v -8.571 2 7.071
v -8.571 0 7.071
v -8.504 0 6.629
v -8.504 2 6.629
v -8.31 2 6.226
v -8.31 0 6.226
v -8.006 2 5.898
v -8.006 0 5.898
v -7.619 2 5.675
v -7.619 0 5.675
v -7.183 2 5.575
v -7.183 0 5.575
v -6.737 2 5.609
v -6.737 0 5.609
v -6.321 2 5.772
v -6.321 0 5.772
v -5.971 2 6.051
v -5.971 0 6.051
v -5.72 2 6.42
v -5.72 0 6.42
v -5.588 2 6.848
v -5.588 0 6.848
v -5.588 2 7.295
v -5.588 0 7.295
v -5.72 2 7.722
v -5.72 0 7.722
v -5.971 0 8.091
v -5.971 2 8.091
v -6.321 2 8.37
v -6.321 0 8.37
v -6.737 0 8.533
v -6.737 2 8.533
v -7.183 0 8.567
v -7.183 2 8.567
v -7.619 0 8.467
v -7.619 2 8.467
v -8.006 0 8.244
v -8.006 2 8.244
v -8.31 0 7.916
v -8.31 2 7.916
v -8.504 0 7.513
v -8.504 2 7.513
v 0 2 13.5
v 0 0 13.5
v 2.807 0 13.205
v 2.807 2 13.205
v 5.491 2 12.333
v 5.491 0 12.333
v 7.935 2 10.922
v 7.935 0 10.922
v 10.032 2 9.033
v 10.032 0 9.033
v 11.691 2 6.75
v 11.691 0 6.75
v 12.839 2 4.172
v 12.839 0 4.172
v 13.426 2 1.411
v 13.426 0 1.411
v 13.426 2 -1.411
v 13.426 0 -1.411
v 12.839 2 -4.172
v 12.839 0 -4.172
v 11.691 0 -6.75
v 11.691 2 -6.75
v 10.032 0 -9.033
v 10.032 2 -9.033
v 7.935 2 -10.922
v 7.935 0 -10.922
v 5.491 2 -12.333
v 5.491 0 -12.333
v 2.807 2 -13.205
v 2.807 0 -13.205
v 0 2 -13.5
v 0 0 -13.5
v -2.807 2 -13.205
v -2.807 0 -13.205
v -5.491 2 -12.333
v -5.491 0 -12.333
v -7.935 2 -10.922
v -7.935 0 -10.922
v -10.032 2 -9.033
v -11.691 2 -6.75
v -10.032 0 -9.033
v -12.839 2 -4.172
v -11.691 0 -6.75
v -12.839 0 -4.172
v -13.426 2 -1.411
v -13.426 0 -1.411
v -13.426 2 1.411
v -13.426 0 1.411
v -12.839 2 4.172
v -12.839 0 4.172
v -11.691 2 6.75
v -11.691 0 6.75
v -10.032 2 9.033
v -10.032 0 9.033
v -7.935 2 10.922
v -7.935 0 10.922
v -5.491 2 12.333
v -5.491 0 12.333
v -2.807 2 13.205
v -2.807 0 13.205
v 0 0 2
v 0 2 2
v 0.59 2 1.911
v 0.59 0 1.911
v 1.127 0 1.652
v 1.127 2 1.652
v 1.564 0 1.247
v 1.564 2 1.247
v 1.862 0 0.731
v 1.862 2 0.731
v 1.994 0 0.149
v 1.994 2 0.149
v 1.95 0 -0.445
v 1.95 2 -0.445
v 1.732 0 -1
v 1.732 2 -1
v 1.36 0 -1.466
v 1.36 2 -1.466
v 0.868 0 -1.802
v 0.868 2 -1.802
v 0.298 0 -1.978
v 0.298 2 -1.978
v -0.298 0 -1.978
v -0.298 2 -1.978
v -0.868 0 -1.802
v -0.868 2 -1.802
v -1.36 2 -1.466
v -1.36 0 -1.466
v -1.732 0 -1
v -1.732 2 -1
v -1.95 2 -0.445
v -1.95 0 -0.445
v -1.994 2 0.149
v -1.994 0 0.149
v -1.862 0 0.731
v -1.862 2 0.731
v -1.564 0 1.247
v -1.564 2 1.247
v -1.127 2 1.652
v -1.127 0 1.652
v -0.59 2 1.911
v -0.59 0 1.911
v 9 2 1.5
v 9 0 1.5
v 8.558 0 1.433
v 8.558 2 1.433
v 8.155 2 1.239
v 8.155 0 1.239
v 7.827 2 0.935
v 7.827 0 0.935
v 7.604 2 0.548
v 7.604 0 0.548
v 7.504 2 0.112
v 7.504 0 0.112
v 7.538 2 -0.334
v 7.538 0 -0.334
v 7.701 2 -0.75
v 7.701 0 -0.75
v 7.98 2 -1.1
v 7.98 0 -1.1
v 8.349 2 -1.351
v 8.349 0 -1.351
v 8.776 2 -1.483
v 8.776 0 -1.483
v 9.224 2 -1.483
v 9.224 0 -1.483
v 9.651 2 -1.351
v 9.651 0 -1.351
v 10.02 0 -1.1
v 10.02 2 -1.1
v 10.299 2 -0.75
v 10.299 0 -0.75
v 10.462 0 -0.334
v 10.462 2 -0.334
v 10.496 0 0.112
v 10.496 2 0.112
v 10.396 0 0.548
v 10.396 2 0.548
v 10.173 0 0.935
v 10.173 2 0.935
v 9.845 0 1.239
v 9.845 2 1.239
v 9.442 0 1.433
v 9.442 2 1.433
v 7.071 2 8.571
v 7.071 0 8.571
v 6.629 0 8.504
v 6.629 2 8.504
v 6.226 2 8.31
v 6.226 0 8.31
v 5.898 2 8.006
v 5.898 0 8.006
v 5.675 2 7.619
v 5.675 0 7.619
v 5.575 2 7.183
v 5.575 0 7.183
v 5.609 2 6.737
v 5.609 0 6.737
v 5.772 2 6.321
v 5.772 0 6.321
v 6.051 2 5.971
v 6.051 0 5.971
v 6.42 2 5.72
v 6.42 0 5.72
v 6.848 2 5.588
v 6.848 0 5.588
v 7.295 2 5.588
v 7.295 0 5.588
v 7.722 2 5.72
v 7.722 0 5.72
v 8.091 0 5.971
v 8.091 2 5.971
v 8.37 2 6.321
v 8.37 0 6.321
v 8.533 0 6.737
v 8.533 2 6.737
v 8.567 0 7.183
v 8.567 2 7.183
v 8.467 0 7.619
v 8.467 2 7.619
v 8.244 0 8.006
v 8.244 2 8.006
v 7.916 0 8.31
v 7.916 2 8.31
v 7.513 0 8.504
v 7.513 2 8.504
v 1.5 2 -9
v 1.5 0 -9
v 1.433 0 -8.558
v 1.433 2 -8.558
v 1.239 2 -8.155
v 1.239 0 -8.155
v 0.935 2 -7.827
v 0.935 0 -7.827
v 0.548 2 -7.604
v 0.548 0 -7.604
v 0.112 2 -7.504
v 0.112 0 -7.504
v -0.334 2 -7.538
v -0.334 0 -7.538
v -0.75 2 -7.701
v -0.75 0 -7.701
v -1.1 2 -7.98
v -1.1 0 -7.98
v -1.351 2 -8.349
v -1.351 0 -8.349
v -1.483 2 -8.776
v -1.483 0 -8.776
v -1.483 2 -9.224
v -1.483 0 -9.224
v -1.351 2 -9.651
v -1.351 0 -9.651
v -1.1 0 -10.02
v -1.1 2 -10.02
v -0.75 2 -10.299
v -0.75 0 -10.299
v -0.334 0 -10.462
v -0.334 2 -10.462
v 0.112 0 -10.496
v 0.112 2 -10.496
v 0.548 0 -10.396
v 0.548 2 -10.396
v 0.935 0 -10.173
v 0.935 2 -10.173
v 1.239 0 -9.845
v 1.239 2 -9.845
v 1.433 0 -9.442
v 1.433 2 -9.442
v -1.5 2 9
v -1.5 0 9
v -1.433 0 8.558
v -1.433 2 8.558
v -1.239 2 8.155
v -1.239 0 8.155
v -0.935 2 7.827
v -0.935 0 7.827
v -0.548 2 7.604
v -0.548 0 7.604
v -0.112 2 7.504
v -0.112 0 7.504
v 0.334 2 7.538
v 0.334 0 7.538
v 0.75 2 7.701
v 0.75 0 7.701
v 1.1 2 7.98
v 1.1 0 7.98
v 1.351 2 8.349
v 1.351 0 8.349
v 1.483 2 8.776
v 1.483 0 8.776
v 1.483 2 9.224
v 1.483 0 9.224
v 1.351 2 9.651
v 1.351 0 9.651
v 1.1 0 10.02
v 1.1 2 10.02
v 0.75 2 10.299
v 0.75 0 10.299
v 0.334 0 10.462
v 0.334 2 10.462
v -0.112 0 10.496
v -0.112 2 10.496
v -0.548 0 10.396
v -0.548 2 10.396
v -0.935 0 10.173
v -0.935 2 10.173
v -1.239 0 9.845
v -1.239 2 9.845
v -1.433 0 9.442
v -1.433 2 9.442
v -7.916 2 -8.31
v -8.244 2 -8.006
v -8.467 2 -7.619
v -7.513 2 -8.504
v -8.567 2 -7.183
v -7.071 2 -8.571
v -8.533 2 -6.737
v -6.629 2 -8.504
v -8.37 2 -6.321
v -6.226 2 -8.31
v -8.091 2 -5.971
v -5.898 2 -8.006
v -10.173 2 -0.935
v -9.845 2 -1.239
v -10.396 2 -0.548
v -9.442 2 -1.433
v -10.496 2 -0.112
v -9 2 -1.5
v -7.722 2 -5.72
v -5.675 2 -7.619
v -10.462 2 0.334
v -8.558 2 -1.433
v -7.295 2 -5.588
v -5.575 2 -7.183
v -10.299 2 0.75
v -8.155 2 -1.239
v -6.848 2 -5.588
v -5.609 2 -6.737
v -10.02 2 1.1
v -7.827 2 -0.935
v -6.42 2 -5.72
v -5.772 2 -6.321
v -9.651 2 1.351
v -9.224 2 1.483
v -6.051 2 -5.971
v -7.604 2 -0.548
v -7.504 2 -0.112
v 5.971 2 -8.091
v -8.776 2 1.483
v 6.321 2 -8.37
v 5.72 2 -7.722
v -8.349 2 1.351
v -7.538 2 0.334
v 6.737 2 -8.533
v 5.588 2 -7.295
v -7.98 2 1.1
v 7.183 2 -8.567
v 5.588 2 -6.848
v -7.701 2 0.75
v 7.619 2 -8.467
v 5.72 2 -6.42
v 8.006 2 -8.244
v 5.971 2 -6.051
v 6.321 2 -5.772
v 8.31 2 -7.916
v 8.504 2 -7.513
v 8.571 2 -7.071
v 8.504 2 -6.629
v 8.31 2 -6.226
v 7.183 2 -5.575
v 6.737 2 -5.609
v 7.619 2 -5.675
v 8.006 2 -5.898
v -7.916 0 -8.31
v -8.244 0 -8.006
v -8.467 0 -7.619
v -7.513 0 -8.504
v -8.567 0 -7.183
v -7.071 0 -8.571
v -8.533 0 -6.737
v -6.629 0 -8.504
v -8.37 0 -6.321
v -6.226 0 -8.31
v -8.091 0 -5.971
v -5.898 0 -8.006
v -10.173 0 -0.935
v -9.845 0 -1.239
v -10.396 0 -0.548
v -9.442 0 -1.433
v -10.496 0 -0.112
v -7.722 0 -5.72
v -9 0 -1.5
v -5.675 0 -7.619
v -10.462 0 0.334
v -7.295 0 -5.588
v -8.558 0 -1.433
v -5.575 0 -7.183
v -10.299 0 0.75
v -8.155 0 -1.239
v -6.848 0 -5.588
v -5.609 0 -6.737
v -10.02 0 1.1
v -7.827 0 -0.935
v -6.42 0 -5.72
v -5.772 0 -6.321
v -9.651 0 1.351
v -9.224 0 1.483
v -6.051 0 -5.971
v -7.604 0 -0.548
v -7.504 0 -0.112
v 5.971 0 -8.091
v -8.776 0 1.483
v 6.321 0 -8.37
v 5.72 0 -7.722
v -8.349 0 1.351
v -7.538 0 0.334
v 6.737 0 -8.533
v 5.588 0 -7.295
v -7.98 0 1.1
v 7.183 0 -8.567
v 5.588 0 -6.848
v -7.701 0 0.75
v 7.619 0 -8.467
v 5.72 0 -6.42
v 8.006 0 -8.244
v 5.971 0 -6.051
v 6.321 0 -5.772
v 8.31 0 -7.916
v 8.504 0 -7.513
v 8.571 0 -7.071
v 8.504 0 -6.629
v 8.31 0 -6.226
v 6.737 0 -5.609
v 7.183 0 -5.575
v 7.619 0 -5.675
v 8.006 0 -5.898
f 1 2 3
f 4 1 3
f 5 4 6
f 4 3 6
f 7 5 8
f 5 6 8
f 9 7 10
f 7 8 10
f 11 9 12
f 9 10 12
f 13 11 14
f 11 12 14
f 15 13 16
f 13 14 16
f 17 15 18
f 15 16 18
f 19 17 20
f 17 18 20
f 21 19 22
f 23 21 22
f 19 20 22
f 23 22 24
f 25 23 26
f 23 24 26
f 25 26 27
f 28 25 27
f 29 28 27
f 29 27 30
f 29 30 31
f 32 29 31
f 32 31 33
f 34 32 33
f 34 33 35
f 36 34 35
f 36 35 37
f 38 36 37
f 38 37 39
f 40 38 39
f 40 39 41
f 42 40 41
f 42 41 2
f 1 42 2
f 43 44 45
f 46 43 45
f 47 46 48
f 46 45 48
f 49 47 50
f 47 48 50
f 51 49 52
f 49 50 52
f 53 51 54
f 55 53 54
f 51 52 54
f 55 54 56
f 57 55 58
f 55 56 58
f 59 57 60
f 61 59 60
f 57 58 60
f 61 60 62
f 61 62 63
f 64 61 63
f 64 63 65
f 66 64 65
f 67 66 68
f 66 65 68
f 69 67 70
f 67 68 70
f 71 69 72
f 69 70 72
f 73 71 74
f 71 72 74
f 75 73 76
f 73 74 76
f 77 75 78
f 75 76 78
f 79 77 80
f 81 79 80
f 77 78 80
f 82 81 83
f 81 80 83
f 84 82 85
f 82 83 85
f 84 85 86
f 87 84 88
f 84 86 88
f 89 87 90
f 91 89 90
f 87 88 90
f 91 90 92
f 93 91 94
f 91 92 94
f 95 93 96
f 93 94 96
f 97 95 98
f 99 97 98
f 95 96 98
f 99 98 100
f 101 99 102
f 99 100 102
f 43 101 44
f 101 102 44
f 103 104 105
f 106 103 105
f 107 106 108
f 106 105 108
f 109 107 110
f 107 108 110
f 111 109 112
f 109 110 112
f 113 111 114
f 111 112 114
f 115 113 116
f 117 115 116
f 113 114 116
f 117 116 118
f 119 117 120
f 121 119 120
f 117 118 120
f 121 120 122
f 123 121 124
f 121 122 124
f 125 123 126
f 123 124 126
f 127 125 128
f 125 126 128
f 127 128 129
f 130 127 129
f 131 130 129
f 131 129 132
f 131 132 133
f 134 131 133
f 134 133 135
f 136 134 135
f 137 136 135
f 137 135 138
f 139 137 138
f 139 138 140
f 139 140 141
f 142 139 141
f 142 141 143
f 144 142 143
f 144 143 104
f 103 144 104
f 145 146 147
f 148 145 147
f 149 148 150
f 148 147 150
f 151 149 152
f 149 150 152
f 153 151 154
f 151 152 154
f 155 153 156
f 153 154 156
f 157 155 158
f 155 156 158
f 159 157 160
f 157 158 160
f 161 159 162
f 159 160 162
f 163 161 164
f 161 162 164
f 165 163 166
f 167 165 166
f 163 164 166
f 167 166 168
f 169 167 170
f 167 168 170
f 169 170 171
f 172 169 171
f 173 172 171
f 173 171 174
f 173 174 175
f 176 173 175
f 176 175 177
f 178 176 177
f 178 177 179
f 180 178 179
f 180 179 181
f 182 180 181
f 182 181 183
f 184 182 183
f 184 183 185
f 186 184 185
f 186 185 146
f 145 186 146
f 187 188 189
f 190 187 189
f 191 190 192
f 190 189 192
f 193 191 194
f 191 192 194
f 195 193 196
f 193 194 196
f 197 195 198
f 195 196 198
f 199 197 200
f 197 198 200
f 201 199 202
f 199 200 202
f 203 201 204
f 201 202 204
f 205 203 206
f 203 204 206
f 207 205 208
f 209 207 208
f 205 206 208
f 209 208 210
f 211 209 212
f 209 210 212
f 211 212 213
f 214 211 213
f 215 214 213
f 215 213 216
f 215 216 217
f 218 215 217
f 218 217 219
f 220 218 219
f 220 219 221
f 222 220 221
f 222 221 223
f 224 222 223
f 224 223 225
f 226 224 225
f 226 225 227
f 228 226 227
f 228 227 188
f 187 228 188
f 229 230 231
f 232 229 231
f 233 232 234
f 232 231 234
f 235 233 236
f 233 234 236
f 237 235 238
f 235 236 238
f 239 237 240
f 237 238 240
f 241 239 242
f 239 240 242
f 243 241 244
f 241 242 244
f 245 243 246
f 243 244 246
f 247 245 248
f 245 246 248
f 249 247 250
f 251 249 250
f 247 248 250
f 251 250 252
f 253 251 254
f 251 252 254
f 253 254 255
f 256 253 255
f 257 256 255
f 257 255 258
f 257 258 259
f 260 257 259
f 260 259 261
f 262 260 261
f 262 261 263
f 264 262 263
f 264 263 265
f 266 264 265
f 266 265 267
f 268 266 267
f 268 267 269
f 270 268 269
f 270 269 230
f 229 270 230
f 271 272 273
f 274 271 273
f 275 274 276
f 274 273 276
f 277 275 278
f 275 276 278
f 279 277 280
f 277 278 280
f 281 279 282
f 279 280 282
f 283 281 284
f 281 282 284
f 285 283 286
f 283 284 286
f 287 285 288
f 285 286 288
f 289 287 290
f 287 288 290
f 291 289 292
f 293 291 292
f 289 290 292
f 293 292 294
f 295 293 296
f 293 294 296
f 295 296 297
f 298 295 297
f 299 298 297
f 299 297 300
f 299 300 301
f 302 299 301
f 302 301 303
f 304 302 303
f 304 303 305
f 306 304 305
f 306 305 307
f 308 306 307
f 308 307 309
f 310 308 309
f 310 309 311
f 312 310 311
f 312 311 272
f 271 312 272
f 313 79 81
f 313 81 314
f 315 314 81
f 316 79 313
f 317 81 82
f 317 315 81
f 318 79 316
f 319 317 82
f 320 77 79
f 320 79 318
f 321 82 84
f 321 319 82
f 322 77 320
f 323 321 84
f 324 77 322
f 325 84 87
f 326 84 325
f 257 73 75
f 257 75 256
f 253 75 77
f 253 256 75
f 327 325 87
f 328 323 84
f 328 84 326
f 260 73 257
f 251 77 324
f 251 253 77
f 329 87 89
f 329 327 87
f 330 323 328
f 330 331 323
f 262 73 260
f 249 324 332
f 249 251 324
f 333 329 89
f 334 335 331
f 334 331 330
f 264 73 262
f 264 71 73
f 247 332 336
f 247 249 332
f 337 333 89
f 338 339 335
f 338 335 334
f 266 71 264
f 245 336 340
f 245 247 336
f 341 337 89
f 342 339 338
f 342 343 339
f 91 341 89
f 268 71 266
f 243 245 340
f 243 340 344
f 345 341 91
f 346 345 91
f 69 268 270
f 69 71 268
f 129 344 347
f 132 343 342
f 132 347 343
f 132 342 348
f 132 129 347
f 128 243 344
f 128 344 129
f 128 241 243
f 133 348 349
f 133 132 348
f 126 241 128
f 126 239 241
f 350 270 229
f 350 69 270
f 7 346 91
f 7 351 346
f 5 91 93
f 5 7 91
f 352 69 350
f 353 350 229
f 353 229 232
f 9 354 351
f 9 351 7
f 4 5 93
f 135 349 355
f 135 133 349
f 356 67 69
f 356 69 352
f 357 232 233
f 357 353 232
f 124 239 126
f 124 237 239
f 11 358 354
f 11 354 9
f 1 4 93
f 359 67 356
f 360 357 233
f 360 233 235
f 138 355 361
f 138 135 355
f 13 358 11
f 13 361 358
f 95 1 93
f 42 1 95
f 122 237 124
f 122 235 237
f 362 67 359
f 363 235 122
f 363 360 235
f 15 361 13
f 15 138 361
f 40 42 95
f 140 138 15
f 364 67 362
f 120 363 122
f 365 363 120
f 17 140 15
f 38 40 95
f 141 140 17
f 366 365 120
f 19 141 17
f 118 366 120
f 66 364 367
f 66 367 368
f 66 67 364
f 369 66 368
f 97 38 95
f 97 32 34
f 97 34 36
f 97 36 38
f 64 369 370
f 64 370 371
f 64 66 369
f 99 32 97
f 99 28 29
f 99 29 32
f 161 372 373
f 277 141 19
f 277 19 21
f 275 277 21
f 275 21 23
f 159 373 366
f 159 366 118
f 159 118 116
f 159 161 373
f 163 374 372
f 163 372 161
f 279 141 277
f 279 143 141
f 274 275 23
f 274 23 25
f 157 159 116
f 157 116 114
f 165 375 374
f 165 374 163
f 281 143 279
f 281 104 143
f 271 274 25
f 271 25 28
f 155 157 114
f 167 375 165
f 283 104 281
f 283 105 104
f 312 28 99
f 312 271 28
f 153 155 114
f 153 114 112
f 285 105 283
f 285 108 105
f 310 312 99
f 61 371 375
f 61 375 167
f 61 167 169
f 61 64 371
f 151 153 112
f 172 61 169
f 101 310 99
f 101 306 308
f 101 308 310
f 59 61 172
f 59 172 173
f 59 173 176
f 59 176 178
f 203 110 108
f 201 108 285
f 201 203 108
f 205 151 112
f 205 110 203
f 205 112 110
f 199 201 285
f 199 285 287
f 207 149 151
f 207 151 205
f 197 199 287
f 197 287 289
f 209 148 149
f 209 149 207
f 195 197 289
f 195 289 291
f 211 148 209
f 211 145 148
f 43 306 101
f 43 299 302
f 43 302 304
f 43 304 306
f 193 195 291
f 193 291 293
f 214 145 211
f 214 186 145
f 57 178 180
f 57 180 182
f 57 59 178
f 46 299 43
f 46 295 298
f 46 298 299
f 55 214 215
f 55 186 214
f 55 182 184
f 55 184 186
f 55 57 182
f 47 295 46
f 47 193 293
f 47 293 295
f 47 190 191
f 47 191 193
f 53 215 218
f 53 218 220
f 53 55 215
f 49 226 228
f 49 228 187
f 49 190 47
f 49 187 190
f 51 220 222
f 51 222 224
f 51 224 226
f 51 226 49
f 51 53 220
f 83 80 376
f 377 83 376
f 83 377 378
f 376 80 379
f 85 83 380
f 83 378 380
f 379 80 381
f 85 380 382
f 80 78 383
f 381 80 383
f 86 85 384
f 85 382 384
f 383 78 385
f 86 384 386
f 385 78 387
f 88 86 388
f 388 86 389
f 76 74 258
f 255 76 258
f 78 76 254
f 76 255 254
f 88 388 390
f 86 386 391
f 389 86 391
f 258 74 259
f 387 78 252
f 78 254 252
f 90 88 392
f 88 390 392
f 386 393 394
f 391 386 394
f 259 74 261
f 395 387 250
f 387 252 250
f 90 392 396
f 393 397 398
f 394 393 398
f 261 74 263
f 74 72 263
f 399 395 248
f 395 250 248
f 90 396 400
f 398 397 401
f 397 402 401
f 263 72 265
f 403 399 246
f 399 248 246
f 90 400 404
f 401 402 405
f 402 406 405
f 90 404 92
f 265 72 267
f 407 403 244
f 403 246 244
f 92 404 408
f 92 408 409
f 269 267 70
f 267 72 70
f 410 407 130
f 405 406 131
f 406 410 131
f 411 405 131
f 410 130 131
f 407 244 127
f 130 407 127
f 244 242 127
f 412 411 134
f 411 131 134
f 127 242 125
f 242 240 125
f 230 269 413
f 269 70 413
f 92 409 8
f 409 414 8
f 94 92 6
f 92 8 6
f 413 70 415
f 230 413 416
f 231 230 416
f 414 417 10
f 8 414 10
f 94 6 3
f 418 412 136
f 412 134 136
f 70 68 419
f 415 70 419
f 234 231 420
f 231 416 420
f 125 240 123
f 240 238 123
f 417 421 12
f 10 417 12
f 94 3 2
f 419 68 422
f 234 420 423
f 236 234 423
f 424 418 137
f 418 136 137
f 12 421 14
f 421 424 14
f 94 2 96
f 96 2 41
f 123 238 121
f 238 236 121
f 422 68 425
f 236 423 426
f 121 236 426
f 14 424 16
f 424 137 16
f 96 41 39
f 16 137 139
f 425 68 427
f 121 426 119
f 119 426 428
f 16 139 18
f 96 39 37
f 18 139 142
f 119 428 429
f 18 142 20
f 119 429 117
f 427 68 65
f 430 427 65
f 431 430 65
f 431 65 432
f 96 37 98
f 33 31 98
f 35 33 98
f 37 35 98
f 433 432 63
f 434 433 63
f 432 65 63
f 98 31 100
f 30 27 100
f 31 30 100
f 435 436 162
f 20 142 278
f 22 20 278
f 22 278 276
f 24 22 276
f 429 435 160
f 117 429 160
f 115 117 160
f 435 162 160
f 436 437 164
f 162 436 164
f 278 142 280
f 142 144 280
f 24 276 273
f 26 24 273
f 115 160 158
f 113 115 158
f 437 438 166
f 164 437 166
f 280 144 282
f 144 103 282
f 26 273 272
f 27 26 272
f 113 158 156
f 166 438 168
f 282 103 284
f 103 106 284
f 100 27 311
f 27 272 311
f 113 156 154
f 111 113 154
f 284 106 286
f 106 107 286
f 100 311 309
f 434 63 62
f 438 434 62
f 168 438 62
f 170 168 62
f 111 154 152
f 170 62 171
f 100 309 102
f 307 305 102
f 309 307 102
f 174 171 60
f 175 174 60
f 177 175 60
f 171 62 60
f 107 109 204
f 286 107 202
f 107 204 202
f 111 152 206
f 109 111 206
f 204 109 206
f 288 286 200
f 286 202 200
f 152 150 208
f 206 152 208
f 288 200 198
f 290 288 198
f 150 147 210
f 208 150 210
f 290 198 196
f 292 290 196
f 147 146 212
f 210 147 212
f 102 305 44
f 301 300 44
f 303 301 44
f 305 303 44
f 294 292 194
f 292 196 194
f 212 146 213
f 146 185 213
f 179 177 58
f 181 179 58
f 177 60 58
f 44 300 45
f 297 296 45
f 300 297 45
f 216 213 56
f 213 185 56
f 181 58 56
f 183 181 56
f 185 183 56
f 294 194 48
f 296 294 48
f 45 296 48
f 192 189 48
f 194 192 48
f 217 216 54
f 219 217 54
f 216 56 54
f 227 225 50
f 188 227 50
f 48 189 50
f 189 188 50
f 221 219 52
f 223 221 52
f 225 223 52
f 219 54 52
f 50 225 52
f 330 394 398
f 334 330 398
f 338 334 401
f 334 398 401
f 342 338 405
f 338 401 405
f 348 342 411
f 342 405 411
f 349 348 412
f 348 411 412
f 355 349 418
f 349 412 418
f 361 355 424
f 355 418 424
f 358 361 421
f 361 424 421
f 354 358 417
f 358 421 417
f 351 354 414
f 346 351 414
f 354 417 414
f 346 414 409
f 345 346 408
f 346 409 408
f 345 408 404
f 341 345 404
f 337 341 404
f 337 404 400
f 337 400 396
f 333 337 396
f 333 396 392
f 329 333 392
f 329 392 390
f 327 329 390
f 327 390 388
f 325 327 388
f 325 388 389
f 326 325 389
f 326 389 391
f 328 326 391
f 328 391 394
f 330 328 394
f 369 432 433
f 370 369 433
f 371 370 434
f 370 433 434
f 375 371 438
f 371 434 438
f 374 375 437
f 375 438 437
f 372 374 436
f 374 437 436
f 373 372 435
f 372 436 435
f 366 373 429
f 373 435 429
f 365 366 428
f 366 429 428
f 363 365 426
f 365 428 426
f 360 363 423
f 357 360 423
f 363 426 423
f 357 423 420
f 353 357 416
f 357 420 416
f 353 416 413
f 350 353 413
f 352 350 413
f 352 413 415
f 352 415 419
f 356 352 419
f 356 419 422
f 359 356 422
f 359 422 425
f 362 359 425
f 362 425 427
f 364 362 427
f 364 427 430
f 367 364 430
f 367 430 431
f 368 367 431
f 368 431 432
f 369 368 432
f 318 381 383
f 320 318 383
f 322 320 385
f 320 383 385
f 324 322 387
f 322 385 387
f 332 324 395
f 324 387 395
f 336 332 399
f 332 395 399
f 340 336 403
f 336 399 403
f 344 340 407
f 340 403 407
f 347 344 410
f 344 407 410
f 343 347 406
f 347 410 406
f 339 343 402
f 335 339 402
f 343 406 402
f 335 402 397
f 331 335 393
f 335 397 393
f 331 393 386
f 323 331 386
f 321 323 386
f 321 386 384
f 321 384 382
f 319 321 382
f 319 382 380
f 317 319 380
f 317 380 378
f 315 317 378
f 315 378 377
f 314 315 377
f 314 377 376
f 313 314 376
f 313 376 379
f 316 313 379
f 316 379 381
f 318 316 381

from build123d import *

# Parameters (mm, degrees)
SKETCH1_R           = 13.5
BOSS_EXTRUDE1_DEPTH = 2
SKETCH4_R           = 1.5
CUT_EXTRUDE1_DEPTH  = 20.19635382
CIRPATTERN1_COUNT   = 4
SKETCH2_R           = 2
CUT_EXTRUDE2_DEPTH  = 20.19635382


with BuildPart() as part:
    # Sketch1 → Boss-Extrude1 (new body)
    with BuildSketch(Plane(origin=(0, 0, 0), x_dir=(1, 0, 0), z_dir=(0, 1, 0))):
        with Locations(Location((0, 0, 0), (0, 0, 270))):
            Circle(SKETCH1_R)
    extrude(amount=BOSS_EXTRUDE1_DEPTH)

    # Sketch4 → Cut-Extrude1 (cut, through all)
    with BuildSketch(Plane.XZ):
        with Locations(Location((-9, 0, 0), (0, 0, 270))):
            Circle(SKETCH4_R)
        with Locations(Location((-7.071067812, -7.071067812, 0), (0, 0, 270))):
            Circle(SKETCH4_R)
    cut_extrude1 = extrude(amount=-CUT_EXTRUDE1_DEPTH, mode=Mode.SUBTRACT)

    # CirPattern1: Cut-Extrude1 ×4 about axis
    cirpattern1_axis = Axis((0, 0, 0), (0, 1, 0))
    for i in range(1, CIRPATTERN1_COUNT):
        add(cut_extrude1.rotate(cirpattern1_axis, i * 360 / CIRPATTERN1_COUNT), mode=Mode.SUBTRACT)

    # Sketch2 → Cut-Extrude2 (cut, through all)
    with BuildSketch(Plane(origin=(0, 2, 0), x_dir=(1, 0, 0), z_dir=(0, 1, 0))):
        with Locations(Location((0, 0, 0), (0, 0, 270))):
            Circle(SKETCH2_R)
    extrude(amount=-CUT_EXTRUDE2_DEPTH, mode=Mode.SUBTRACT)


solid = part.part
